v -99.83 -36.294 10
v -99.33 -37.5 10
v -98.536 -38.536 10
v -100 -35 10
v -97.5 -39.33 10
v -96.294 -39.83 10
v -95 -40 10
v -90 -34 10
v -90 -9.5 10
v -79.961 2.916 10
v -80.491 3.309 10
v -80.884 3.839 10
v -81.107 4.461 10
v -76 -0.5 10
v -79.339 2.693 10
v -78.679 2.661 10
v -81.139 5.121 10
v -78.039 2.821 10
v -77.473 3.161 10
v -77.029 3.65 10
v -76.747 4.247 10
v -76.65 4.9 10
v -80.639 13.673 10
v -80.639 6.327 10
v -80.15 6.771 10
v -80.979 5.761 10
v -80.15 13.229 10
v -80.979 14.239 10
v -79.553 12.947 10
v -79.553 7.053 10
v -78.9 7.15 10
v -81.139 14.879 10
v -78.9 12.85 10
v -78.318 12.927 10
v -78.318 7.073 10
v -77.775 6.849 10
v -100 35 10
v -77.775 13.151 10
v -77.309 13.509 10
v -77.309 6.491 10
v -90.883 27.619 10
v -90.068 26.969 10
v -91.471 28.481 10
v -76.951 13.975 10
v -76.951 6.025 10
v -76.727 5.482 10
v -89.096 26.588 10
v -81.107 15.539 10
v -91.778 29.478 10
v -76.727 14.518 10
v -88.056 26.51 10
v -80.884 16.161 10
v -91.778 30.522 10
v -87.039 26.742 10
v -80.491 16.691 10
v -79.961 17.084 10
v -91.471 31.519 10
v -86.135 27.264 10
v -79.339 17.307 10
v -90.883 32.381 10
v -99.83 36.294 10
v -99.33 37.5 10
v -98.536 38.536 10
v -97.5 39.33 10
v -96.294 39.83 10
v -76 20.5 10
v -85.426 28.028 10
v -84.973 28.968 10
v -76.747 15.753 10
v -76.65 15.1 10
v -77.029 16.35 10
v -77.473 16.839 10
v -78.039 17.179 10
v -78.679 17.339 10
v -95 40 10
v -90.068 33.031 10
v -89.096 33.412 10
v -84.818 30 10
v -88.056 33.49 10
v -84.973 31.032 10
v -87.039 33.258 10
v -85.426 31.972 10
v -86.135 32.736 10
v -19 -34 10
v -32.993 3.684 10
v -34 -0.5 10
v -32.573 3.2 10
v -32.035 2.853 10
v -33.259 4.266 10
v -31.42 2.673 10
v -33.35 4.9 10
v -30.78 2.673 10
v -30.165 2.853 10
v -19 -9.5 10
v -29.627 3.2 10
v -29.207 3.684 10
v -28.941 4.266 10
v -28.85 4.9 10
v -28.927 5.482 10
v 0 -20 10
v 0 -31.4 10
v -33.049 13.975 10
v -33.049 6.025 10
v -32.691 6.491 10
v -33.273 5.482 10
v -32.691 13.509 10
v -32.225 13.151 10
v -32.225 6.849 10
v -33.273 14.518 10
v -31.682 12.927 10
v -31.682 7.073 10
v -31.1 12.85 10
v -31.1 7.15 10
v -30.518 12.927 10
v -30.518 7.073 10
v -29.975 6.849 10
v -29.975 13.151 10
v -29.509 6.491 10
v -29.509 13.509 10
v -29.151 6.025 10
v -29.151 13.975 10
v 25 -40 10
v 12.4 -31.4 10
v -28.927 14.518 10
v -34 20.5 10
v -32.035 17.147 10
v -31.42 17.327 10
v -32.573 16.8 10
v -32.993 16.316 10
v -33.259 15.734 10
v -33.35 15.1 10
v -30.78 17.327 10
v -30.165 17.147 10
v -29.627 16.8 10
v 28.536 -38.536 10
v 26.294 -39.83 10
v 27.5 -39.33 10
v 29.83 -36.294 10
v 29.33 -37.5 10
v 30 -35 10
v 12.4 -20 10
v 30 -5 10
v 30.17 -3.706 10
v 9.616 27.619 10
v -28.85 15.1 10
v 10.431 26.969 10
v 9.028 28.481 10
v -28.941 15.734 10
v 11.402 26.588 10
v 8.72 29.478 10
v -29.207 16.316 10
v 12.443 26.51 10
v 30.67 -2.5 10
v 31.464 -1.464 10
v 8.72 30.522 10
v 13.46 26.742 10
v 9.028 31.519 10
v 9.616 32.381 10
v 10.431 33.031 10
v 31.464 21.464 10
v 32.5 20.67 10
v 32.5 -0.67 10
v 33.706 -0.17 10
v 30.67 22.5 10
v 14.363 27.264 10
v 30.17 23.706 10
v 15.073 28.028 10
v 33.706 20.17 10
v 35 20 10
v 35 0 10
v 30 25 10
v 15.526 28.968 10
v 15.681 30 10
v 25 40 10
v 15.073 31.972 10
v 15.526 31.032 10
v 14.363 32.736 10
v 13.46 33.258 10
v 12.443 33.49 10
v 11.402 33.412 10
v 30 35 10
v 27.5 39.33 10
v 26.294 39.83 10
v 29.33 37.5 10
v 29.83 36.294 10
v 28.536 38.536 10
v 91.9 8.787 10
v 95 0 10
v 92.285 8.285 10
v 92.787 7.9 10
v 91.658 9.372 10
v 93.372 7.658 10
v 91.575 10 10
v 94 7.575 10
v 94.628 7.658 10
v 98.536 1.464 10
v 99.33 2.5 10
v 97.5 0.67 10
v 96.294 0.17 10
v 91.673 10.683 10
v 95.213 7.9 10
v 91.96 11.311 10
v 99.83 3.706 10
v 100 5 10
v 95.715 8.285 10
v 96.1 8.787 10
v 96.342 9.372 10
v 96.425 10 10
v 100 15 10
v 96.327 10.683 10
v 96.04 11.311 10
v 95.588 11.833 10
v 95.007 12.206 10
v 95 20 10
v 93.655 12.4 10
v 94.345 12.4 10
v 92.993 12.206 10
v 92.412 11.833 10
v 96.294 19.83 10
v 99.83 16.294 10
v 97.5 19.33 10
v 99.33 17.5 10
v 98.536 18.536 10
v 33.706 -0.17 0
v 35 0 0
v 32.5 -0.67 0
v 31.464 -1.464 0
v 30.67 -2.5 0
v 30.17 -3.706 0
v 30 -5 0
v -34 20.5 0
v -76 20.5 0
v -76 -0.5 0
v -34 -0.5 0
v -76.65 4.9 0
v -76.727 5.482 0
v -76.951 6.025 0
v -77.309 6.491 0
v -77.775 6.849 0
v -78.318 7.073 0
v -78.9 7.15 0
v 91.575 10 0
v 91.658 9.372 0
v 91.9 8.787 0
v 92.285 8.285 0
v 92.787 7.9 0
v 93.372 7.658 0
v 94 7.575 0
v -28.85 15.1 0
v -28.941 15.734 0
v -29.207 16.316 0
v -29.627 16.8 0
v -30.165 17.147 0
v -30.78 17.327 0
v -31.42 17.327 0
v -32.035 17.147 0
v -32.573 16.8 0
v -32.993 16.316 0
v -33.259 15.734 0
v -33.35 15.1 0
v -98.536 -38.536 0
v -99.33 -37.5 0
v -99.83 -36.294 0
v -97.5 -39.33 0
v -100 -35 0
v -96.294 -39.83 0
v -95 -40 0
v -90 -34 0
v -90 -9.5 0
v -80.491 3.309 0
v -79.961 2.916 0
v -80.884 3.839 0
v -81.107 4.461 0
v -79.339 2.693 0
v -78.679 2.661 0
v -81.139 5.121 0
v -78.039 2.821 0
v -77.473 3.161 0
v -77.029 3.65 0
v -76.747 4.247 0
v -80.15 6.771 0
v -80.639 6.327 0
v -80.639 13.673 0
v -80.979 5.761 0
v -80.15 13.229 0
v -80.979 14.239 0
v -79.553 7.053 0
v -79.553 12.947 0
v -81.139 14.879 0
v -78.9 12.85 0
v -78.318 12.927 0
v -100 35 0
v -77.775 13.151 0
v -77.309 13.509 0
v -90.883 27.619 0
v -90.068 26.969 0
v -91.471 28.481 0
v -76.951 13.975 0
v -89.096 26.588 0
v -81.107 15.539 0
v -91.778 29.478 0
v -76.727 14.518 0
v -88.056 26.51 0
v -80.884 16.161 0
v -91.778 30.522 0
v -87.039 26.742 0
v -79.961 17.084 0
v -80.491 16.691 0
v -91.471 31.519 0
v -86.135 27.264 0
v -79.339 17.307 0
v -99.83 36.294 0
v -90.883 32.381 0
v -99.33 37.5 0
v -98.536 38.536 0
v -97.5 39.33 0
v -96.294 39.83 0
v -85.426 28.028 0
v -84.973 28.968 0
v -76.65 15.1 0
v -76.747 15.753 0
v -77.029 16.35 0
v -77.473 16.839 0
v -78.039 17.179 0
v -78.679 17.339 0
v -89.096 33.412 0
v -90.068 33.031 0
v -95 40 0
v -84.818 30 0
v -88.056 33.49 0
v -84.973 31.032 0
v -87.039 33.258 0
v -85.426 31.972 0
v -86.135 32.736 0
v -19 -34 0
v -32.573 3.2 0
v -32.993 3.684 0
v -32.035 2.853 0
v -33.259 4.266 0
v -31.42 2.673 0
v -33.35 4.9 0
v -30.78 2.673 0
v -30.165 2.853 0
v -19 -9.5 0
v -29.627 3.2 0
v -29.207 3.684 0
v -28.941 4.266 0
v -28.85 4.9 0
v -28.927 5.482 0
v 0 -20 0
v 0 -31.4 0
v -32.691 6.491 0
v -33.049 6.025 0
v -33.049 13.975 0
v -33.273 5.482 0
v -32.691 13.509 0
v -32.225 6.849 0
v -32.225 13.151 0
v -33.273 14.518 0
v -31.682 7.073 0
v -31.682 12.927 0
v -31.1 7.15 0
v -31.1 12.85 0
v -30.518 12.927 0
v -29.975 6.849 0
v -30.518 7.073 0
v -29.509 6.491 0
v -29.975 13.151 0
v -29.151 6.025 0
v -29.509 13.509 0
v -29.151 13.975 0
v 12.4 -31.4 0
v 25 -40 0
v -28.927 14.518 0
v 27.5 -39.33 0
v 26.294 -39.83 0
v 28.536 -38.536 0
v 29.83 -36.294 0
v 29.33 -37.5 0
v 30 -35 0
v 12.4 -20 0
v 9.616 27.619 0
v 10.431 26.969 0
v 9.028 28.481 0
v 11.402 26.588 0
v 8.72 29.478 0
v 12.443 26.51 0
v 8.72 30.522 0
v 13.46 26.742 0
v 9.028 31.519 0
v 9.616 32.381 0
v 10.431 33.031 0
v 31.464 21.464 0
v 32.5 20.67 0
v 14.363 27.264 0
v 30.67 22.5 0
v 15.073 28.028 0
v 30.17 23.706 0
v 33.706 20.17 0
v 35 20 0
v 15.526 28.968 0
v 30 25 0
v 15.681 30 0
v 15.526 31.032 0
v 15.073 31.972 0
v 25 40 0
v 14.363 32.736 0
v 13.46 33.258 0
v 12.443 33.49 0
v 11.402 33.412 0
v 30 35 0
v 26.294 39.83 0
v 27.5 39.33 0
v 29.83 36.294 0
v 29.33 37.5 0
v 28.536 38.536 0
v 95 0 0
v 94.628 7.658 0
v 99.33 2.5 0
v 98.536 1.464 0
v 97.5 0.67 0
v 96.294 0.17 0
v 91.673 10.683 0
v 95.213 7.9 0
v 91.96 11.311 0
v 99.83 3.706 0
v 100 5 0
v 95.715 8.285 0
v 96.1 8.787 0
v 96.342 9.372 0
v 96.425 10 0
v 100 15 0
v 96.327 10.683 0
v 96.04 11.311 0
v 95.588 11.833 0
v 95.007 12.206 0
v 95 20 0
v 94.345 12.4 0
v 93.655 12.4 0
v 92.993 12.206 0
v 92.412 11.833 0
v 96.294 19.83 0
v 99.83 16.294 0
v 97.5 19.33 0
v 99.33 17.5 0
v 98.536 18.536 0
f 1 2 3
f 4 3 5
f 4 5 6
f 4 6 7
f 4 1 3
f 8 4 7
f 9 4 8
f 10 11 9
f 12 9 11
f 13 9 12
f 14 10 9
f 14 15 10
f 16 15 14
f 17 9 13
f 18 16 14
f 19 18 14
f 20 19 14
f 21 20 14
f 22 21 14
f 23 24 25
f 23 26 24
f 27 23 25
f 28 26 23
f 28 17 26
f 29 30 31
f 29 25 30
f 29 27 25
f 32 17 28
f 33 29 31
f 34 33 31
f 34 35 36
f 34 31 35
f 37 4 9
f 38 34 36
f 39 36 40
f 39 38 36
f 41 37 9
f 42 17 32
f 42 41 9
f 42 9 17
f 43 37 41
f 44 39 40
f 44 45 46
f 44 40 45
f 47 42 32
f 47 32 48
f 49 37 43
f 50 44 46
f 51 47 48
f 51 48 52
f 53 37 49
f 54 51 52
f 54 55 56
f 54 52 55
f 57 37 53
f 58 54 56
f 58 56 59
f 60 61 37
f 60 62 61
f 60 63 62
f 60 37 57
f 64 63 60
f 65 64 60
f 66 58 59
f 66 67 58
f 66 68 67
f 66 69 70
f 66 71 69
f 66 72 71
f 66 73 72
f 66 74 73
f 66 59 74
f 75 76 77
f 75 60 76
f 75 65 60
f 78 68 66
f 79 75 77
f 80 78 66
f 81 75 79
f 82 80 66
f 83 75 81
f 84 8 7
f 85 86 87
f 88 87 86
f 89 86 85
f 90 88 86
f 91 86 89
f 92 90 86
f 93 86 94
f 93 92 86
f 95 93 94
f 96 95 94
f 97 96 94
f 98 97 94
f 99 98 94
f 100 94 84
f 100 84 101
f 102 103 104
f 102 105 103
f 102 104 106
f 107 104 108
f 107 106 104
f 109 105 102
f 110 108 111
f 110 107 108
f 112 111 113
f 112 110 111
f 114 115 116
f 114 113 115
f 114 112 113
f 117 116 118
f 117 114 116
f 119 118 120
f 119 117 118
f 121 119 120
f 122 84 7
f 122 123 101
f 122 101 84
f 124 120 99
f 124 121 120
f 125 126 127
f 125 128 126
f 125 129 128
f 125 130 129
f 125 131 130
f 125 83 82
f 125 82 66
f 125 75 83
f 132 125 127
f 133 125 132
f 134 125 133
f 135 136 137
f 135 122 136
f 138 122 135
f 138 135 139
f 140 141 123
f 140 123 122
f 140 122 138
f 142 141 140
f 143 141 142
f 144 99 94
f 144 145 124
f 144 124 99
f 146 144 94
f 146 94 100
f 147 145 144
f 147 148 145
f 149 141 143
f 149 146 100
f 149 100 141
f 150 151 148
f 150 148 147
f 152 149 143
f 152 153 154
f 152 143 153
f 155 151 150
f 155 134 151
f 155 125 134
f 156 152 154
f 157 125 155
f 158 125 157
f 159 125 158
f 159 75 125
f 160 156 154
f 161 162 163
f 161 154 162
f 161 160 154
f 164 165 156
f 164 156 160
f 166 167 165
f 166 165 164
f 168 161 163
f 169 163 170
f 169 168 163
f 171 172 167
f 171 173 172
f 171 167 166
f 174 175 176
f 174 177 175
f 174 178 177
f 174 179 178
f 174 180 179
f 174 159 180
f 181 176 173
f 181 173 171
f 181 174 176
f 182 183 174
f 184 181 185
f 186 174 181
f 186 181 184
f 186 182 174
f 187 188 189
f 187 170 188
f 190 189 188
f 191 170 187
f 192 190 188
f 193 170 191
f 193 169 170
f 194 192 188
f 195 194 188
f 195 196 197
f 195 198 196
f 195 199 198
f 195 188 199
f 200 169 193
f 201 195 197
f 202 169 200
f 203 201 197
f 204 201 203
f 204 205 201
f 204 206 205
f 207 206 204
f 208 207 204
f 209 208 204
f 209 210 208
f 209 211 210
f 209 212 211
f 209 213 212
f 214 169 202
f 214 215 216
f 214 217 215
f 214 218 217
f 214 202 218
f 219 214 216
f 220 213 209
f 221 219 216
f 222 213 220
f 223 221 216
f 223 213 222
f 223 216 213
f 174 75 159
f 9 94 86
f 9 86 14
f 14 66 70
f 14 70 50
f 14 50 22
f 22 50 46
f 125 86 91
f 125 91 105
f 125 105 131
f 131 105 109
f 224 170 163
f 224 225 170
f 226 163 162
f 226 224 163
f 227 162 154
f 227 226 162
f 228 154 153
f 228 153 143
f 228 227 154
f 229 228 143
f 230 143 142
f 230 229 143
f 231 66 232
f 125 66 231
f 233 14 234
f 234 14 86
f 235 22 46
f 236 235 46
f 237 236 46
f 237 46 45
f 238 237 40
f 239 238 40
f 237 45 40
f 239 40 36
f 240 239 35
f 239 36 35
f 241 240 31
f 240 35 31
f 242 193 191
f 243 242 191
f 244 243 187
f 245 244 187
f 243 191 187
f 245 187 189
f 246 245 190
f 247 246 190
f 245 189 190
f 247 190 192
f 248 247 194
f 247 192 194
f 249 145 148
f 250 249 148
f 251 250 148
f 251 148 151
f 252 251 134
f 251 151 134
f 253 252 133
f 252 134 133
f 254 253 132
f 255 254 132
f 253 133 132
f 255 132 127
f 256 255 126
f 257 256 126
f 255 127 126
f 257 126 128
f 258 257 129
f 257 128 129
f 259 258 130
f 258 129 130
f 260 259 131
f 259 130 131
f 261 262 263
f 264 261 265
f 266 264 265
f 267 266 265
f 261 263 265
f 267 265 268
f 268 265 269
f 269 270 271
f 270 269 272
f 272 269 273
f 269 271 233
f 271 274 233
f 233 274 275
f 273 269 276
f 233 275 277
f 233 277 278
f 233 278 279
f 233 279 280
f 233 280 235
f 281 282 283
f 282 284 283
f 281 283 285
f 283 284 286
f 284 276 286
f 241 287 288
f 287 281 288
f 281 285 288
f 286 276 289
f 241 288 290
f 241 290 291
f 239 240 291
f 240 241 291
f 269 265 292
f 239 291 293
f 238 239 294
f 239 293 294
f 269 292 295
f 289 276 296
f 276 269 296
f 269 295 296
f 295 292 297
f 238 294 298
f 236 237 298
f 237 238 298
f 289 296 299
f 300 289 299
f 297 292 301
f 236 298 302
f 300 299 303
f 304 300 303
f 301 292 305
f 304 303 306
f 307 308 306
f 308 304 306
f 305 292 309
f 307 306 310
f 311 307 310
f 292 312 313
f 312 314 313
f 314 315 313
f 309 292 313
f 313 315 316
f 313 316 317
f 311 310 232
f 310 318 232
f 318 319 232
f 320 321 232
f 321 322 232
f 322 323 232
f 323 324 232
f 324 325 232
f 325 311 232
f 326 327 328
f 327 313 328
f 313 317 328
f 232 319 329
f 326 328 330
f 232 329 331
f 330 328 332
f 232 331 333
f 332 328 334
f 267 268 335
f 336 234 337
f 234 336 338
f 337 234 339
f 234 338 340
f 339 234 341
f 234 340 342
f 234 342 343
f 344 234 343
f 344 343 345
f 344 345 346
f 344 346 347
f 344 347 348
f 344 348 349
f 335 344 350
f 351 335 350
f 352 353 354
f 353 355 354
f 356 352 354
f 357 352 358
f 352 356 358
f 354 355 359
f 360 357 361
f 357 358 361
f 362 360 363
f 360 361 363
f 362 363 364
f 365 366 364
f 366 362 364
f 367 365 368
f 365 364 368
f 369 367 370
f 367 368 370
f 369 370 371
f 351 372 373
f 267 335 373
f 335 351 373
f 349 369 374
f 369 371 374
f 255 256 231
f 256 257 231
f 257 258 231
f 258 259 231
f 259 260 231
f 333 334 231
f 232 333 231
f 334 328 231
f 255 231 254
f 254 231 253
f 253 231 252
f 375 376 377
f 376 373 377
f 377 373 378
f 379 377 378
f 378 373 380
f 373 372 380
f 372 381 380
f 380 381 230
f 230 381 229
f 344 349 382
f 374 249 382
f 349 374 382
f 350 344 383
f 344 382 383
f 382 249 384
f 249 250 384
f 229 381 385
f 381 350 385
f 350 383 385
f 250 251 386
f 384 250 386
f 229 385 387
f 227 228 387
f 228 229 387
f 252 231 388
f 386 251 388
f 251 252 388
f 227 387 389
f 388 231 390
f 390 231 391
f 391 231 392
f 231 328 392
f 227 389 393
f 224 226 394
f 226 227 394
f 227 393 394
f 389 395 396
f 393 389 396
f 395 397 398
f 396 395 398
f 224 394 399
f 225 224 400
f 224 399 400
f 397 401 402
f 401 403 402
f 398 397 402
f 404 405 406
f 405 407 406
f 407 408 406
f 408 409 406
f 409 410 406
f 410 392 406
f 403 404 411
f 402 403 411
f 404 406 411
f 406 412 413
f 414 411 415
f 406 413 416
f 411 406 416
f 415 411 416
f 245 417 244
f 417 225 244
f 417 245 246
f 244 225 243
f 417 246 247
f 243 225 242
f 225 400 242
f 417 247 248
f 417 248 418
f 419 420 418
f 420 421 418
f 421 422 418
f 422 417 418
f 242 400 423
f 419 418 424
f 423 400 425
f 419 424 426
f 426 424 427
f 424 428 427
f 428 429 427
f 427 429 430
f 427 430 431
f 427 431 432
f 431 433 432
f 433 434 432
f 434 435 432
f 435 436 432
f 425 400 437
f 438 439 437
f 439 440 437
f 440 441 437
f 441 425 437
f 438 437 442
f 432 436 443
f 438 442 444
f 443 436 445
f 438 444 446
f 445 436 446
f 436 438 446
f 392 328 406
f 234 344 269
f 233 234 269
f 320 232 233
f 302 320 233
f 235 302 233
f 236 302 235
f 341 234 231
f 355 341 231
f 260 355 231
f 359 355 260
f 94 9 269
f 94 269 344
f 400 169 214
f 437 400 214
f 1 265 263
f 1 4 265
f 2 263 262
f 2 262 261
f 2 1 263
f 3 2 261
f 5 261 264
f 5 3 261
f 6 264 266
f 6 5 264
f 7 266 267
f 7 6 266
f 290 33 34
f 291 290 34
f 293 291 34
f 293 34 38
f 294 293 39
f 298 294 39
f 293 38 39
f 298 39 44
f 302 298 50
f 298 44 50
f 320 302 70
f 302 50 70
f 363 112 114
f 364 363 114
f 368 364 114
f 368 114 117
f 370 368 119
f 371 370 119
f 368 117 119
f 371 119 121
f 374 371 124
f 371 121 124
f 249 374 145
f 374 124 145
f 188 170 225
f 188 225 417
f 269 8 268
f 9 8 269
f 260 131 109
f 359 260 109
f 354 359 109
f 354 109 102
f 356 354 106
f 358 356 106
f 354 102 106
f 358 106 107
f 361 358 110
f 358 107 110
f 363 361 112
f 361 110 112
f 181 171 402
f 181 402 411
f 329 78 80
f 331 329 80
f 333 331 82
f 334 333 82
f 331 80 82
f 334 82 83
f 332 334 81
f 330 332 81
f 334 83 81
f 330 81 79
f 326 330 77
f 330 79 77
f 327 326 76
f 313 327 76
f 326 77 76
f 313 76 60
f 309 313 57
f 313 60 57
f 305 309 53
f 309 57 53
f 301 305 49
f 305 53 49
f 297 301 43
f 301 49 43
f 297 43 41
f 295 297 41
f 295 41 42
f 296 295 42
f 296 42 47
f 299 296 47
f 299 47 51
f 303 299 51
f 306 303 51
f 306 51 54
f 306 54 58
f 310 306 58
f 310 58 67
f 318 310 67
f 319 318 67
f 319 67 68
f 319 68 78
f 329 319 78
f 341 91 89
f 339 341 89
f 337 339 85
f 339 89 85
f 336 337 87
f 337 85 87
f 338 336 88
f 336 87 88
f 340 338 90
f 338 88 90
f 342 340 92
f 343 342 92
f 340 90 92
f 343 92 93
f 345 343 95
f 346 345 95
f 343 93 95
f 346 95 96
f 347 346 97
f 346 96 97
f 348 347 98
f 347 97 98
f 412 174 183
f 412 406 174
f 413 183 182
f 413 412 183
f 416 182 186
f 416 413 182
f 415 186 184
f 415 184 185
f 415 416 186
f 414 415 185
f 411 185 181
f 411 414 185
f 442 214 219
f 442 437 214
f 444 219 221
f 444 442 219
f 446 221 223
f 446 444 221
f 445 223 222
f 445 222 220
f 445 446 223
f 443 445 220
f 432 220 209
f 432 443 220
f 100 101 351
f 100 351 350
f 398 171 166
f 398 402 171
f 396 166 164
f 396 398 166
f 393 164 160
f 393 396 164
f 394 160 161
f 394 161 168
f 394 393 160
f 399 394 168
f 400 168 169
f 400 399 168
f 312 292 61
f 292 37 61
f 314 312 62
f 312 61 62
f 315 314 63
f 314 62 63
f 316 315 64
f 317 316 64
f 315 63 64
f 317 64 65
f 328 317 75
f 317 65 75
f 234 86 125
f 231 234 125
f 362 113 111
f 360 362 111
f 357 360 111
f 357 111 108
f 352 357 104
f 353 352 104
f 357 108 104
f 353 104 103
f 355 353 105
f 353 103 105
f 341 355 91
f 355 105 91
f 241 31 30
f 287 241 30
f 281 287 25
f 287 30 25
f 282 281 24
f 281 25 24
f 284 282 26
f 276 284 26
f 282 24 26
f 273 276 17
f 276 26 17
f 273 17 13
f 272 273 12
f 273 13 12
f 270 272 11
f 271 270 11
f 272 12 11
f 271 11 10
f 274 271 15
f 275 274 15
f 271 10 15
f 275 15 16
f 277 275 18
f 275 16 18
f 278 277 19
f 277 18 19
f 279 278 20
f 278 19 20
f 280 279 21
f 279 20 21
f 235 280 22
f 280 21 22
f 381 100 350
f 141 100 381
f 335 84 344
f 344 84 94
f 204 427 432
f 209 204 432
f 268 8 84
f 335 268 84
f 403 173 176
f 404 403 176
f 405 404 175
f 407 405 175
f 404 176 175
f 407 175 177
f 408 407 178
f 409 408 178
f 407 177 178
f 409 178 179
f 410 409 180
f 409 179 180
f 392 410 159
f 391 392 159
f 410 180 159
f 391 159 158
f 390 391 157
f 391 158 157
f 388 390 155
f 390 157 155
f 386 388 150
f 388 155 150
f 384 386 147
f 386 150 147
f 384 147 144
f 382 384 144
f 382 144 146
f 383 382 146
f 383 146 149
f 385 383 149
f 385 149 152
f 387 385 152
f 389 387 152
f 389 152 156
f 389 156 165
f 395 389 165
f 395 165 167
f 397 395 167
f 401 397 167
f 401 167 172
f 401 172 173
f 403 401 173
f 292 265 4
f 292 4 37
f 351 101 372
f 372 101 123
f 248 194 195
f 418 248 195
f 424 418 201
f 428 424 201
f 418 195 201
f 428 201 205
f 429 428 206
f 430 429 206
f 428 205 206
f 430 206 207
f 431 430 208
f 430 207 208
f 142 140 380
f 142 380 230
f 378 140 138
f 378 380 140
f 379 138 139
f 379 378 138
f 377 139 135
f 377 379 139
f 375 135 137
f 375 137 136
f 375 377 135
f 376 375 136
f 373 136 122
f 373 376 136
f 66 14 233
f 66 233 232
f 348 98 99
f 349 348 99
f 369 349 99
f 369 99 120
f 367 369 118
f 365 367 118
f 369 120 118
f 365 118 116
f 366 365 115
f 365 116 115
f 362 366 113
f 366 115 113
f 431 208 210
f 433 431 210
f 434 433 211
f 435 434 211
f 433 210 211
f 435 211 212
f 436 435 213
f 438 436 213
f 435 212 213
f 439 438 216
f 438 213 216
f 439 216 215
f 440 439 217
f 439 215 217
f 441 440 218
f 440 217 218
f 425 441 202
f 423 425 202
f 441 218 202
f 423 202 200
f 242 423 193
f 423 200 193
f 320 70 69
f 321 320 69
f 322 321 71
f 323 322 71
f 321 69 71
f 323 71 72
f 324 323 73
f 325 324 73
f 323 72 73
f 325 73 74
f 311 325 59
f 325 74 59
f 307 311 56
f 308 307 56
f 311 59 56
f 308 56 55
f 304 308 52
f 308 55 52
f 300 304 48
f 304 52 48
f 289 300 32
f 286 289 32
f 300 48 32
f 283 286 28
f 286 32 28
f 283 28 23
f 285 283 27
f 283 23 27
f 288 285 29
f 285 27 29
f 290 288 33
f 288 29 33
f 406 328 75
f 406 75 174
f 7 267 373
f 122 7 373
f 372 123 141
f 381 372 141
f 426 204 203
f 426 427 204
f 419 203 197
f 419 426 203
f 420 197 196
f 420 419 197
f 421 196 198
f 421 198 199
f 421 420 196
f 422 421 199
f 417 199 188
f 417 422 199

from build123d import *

# Parameters (mm, degrees)
F0_W      = 200
F0_H      = 80
F1_DEPTH  = 10
F2_W      = 42
F2_H      = 21
F3_DEPTH  = 10.001
F4_W      = 71
F4_H      = 24.5
F5_DEPTH  = 10.001
F6_R      = 3.5
F7_DEPTH  = 10.001
F8_R      = 5
F11_W     = 70
F11_H     = 20
F11_H_2   = 40
F9_W      = 12.4
F9_H      = 11.4
F12_DEPTH = 10.001
F13_R     = 5


with BuildPart() as f1:
    # F0 (on Top) → F1 (new body)
    with BuildSketch(Plane.XY):
        Rectangle(F0_W, F0_H)
    extrude(amount=F1_DEPTH)

    # F2 (on face) → F3 (cut, through all)
    with BuildSketch(Plane.XY.offset(10)):
        with Locations((-55, 10)):
            Rectangle(F2_W, F2_H)
    extrude(amount=-F3_DEPTH, mode=Mode.SUBTRACT)

    # F4 (on face) → F5 (cut, through all)
    with BuildSketch(Plane.XY.offset(10)):
        with BuildLine():
            Line((-78.9, 12.85), (-78.9, 15.1))
            Line((-78.9, 15.1), (-76.65, 15.1))
            ThreePointArc((-76.65, 15.1), (-80.4909902577, 16.6909902577), (-78.9, 12.85))
        make_face()
        with BuildLine():
            Line((-76.65, 15.1), (-78.9, 15.1))
            Line((-78.9, 15.1), (-78.9, 12.85))
            ThreePointArc((-78.9, 12.85), (-77.3090097423, 13.5090097423), (-76.65, 15.1))
        make_face()
        with BuildLine():
            Line((-78.9, 4.9), (-78.9, 7.15))
            ThreePointArc((-78.9, 7.15), (-80.4909902577, 3.3090097423), (-76.65, 4.9))
            Line((-76.65, 4.9), (-78.9, 4.9))
        make_face()
        with BuildLine():
            ThreePointArc((-76.65, 4.9), (-77.3090097423, 6.4909902577), (-78.9, 7.15))
            Line((-78.9, 7.15), (-78.9, 4.9))
            Line((-78.9, 4.9), (-76.65, 4.9))
        make_face()
        with BuildLine():
            Line((-31.1, 15.1), (-33.35, 15.1))
            ThreePointArc((-33.35, 15.1), (-32.6909902577, 13.5090097423), (-31.1, 12.85))
            Line((-31.1, 12.85), (-31.1, 15.1))
        make_face()
        with BuildLine():
            ThreePointArc((-28.85, 15.1), (-31.1, 17.35), (-33.35, 15.1))
            Line((-33.35, 15.1), (-31.1, 15.1))
            Line((-31.1, 15.1), (-31.1, 12.85))
            ThreePointArc((-31.1, 12.85), (-29.5090097423, 13.5090097423), (-28.85, 15.1))
        make_face()
        with BuildLine():
            ThreePointArc((-31.1, 7.15), (-32.6909902577, 6.4909902577), (-33.35, 4.9))
            Line((-33.35, 4.9), (-31.1, 4.9))
            Line((-31.1, 4.9), (-31.1, 7.15))
        make_face()
        with BuildLine():
            Line((-31.1, 4.9), (-33.35, 4.9))
            ThreePointArc((-33.35, 4.9), (-31.1, 2.65), (-28.85, 4.9))
            ThreePointArc((-28.85, 4.9), (-29.5090097423, 6.4909902577), (-31.1, 7.15))
            Line((-31.1, 7.15), (-31.1, 4.9))
        make_face()
        with Locations((-54.5, -21.75)):
            Rectangle(F4_W, F4_H)
    extrude(amount=-F5_DEPTH, mode=Mode.SUBTRACT)

    # F6 (on face) → F7 (cut, through all)
    with BuildSketch(Plane.XY.offset(10)):
        with Locations((-88.3175069503, 30)):
            Circle(F6_R)
        with Locations((12.1812492609, 30)):
            Circle(F6_R)
    extrude(amount=-F7_DEPTH, mode=Mode.SUBTRACT)

    # F8
    f8_edges = [f1.edges().sort_by_distance(p)[0] for p in [
        (-100, 40, 5),
        (-100, -40, 5),
        (100, 40, 5),
        (100, -40, 5),
    ]]
    fillet(f8_edges, radius=F8_R)

    # F11 (on face) + F10 (on face) + F9 (on face) → F12 (cut, through all)
    with BuildSketch(Plane.XY.offset(10)):
        with Locations((65, 30)):
            Rectangle(F11_W, F11_H)
        with Locations((65, -20)):
            Rectangle(F11_W, F11_H_2)
    with BuildSketch(Plane.XY.offset(10)):
        with BuildLine():
            ThreePointArc((96.425, 10), (94, 12.425), (91.575, 10))
            Line((91.575, 10), (94, 10))
            Line((94, 10), (94, 7.575))
            ThreePointArc((94, 7.575), (95.7147339444, 8.2852660556), (96.425, 10))
        make_face()
        with BuildLine():
            Line((94, 10), (91.575, 10))
            ThreePointArc((91.575, 10), (92.2852660556, 8.2852660556), (94, 7.575))
            Line((94, 7.575), (94, 10))
        make_face()
    with BuildSketch(Plane.XY.offset(10)):
        with Locations((6.2, -25.7)):
            Rectangle(F9_W, F9_H)
    extrude(amount=-F12_DEPTH, mode=Mode.SUBTRACT)

    # F13
    f13_edges = [f1.edges().sort_by_distance(p)[0] for p in [
        (30, 40, 5),
        (30, 20, 5),
        (100, 20, 5),
        (30, -40, 5),
        (100, 0, 5),
        (30, 0, 5),
    ]]
    fillet(f13_edges, radius=F13_R)


solid = f1.part
